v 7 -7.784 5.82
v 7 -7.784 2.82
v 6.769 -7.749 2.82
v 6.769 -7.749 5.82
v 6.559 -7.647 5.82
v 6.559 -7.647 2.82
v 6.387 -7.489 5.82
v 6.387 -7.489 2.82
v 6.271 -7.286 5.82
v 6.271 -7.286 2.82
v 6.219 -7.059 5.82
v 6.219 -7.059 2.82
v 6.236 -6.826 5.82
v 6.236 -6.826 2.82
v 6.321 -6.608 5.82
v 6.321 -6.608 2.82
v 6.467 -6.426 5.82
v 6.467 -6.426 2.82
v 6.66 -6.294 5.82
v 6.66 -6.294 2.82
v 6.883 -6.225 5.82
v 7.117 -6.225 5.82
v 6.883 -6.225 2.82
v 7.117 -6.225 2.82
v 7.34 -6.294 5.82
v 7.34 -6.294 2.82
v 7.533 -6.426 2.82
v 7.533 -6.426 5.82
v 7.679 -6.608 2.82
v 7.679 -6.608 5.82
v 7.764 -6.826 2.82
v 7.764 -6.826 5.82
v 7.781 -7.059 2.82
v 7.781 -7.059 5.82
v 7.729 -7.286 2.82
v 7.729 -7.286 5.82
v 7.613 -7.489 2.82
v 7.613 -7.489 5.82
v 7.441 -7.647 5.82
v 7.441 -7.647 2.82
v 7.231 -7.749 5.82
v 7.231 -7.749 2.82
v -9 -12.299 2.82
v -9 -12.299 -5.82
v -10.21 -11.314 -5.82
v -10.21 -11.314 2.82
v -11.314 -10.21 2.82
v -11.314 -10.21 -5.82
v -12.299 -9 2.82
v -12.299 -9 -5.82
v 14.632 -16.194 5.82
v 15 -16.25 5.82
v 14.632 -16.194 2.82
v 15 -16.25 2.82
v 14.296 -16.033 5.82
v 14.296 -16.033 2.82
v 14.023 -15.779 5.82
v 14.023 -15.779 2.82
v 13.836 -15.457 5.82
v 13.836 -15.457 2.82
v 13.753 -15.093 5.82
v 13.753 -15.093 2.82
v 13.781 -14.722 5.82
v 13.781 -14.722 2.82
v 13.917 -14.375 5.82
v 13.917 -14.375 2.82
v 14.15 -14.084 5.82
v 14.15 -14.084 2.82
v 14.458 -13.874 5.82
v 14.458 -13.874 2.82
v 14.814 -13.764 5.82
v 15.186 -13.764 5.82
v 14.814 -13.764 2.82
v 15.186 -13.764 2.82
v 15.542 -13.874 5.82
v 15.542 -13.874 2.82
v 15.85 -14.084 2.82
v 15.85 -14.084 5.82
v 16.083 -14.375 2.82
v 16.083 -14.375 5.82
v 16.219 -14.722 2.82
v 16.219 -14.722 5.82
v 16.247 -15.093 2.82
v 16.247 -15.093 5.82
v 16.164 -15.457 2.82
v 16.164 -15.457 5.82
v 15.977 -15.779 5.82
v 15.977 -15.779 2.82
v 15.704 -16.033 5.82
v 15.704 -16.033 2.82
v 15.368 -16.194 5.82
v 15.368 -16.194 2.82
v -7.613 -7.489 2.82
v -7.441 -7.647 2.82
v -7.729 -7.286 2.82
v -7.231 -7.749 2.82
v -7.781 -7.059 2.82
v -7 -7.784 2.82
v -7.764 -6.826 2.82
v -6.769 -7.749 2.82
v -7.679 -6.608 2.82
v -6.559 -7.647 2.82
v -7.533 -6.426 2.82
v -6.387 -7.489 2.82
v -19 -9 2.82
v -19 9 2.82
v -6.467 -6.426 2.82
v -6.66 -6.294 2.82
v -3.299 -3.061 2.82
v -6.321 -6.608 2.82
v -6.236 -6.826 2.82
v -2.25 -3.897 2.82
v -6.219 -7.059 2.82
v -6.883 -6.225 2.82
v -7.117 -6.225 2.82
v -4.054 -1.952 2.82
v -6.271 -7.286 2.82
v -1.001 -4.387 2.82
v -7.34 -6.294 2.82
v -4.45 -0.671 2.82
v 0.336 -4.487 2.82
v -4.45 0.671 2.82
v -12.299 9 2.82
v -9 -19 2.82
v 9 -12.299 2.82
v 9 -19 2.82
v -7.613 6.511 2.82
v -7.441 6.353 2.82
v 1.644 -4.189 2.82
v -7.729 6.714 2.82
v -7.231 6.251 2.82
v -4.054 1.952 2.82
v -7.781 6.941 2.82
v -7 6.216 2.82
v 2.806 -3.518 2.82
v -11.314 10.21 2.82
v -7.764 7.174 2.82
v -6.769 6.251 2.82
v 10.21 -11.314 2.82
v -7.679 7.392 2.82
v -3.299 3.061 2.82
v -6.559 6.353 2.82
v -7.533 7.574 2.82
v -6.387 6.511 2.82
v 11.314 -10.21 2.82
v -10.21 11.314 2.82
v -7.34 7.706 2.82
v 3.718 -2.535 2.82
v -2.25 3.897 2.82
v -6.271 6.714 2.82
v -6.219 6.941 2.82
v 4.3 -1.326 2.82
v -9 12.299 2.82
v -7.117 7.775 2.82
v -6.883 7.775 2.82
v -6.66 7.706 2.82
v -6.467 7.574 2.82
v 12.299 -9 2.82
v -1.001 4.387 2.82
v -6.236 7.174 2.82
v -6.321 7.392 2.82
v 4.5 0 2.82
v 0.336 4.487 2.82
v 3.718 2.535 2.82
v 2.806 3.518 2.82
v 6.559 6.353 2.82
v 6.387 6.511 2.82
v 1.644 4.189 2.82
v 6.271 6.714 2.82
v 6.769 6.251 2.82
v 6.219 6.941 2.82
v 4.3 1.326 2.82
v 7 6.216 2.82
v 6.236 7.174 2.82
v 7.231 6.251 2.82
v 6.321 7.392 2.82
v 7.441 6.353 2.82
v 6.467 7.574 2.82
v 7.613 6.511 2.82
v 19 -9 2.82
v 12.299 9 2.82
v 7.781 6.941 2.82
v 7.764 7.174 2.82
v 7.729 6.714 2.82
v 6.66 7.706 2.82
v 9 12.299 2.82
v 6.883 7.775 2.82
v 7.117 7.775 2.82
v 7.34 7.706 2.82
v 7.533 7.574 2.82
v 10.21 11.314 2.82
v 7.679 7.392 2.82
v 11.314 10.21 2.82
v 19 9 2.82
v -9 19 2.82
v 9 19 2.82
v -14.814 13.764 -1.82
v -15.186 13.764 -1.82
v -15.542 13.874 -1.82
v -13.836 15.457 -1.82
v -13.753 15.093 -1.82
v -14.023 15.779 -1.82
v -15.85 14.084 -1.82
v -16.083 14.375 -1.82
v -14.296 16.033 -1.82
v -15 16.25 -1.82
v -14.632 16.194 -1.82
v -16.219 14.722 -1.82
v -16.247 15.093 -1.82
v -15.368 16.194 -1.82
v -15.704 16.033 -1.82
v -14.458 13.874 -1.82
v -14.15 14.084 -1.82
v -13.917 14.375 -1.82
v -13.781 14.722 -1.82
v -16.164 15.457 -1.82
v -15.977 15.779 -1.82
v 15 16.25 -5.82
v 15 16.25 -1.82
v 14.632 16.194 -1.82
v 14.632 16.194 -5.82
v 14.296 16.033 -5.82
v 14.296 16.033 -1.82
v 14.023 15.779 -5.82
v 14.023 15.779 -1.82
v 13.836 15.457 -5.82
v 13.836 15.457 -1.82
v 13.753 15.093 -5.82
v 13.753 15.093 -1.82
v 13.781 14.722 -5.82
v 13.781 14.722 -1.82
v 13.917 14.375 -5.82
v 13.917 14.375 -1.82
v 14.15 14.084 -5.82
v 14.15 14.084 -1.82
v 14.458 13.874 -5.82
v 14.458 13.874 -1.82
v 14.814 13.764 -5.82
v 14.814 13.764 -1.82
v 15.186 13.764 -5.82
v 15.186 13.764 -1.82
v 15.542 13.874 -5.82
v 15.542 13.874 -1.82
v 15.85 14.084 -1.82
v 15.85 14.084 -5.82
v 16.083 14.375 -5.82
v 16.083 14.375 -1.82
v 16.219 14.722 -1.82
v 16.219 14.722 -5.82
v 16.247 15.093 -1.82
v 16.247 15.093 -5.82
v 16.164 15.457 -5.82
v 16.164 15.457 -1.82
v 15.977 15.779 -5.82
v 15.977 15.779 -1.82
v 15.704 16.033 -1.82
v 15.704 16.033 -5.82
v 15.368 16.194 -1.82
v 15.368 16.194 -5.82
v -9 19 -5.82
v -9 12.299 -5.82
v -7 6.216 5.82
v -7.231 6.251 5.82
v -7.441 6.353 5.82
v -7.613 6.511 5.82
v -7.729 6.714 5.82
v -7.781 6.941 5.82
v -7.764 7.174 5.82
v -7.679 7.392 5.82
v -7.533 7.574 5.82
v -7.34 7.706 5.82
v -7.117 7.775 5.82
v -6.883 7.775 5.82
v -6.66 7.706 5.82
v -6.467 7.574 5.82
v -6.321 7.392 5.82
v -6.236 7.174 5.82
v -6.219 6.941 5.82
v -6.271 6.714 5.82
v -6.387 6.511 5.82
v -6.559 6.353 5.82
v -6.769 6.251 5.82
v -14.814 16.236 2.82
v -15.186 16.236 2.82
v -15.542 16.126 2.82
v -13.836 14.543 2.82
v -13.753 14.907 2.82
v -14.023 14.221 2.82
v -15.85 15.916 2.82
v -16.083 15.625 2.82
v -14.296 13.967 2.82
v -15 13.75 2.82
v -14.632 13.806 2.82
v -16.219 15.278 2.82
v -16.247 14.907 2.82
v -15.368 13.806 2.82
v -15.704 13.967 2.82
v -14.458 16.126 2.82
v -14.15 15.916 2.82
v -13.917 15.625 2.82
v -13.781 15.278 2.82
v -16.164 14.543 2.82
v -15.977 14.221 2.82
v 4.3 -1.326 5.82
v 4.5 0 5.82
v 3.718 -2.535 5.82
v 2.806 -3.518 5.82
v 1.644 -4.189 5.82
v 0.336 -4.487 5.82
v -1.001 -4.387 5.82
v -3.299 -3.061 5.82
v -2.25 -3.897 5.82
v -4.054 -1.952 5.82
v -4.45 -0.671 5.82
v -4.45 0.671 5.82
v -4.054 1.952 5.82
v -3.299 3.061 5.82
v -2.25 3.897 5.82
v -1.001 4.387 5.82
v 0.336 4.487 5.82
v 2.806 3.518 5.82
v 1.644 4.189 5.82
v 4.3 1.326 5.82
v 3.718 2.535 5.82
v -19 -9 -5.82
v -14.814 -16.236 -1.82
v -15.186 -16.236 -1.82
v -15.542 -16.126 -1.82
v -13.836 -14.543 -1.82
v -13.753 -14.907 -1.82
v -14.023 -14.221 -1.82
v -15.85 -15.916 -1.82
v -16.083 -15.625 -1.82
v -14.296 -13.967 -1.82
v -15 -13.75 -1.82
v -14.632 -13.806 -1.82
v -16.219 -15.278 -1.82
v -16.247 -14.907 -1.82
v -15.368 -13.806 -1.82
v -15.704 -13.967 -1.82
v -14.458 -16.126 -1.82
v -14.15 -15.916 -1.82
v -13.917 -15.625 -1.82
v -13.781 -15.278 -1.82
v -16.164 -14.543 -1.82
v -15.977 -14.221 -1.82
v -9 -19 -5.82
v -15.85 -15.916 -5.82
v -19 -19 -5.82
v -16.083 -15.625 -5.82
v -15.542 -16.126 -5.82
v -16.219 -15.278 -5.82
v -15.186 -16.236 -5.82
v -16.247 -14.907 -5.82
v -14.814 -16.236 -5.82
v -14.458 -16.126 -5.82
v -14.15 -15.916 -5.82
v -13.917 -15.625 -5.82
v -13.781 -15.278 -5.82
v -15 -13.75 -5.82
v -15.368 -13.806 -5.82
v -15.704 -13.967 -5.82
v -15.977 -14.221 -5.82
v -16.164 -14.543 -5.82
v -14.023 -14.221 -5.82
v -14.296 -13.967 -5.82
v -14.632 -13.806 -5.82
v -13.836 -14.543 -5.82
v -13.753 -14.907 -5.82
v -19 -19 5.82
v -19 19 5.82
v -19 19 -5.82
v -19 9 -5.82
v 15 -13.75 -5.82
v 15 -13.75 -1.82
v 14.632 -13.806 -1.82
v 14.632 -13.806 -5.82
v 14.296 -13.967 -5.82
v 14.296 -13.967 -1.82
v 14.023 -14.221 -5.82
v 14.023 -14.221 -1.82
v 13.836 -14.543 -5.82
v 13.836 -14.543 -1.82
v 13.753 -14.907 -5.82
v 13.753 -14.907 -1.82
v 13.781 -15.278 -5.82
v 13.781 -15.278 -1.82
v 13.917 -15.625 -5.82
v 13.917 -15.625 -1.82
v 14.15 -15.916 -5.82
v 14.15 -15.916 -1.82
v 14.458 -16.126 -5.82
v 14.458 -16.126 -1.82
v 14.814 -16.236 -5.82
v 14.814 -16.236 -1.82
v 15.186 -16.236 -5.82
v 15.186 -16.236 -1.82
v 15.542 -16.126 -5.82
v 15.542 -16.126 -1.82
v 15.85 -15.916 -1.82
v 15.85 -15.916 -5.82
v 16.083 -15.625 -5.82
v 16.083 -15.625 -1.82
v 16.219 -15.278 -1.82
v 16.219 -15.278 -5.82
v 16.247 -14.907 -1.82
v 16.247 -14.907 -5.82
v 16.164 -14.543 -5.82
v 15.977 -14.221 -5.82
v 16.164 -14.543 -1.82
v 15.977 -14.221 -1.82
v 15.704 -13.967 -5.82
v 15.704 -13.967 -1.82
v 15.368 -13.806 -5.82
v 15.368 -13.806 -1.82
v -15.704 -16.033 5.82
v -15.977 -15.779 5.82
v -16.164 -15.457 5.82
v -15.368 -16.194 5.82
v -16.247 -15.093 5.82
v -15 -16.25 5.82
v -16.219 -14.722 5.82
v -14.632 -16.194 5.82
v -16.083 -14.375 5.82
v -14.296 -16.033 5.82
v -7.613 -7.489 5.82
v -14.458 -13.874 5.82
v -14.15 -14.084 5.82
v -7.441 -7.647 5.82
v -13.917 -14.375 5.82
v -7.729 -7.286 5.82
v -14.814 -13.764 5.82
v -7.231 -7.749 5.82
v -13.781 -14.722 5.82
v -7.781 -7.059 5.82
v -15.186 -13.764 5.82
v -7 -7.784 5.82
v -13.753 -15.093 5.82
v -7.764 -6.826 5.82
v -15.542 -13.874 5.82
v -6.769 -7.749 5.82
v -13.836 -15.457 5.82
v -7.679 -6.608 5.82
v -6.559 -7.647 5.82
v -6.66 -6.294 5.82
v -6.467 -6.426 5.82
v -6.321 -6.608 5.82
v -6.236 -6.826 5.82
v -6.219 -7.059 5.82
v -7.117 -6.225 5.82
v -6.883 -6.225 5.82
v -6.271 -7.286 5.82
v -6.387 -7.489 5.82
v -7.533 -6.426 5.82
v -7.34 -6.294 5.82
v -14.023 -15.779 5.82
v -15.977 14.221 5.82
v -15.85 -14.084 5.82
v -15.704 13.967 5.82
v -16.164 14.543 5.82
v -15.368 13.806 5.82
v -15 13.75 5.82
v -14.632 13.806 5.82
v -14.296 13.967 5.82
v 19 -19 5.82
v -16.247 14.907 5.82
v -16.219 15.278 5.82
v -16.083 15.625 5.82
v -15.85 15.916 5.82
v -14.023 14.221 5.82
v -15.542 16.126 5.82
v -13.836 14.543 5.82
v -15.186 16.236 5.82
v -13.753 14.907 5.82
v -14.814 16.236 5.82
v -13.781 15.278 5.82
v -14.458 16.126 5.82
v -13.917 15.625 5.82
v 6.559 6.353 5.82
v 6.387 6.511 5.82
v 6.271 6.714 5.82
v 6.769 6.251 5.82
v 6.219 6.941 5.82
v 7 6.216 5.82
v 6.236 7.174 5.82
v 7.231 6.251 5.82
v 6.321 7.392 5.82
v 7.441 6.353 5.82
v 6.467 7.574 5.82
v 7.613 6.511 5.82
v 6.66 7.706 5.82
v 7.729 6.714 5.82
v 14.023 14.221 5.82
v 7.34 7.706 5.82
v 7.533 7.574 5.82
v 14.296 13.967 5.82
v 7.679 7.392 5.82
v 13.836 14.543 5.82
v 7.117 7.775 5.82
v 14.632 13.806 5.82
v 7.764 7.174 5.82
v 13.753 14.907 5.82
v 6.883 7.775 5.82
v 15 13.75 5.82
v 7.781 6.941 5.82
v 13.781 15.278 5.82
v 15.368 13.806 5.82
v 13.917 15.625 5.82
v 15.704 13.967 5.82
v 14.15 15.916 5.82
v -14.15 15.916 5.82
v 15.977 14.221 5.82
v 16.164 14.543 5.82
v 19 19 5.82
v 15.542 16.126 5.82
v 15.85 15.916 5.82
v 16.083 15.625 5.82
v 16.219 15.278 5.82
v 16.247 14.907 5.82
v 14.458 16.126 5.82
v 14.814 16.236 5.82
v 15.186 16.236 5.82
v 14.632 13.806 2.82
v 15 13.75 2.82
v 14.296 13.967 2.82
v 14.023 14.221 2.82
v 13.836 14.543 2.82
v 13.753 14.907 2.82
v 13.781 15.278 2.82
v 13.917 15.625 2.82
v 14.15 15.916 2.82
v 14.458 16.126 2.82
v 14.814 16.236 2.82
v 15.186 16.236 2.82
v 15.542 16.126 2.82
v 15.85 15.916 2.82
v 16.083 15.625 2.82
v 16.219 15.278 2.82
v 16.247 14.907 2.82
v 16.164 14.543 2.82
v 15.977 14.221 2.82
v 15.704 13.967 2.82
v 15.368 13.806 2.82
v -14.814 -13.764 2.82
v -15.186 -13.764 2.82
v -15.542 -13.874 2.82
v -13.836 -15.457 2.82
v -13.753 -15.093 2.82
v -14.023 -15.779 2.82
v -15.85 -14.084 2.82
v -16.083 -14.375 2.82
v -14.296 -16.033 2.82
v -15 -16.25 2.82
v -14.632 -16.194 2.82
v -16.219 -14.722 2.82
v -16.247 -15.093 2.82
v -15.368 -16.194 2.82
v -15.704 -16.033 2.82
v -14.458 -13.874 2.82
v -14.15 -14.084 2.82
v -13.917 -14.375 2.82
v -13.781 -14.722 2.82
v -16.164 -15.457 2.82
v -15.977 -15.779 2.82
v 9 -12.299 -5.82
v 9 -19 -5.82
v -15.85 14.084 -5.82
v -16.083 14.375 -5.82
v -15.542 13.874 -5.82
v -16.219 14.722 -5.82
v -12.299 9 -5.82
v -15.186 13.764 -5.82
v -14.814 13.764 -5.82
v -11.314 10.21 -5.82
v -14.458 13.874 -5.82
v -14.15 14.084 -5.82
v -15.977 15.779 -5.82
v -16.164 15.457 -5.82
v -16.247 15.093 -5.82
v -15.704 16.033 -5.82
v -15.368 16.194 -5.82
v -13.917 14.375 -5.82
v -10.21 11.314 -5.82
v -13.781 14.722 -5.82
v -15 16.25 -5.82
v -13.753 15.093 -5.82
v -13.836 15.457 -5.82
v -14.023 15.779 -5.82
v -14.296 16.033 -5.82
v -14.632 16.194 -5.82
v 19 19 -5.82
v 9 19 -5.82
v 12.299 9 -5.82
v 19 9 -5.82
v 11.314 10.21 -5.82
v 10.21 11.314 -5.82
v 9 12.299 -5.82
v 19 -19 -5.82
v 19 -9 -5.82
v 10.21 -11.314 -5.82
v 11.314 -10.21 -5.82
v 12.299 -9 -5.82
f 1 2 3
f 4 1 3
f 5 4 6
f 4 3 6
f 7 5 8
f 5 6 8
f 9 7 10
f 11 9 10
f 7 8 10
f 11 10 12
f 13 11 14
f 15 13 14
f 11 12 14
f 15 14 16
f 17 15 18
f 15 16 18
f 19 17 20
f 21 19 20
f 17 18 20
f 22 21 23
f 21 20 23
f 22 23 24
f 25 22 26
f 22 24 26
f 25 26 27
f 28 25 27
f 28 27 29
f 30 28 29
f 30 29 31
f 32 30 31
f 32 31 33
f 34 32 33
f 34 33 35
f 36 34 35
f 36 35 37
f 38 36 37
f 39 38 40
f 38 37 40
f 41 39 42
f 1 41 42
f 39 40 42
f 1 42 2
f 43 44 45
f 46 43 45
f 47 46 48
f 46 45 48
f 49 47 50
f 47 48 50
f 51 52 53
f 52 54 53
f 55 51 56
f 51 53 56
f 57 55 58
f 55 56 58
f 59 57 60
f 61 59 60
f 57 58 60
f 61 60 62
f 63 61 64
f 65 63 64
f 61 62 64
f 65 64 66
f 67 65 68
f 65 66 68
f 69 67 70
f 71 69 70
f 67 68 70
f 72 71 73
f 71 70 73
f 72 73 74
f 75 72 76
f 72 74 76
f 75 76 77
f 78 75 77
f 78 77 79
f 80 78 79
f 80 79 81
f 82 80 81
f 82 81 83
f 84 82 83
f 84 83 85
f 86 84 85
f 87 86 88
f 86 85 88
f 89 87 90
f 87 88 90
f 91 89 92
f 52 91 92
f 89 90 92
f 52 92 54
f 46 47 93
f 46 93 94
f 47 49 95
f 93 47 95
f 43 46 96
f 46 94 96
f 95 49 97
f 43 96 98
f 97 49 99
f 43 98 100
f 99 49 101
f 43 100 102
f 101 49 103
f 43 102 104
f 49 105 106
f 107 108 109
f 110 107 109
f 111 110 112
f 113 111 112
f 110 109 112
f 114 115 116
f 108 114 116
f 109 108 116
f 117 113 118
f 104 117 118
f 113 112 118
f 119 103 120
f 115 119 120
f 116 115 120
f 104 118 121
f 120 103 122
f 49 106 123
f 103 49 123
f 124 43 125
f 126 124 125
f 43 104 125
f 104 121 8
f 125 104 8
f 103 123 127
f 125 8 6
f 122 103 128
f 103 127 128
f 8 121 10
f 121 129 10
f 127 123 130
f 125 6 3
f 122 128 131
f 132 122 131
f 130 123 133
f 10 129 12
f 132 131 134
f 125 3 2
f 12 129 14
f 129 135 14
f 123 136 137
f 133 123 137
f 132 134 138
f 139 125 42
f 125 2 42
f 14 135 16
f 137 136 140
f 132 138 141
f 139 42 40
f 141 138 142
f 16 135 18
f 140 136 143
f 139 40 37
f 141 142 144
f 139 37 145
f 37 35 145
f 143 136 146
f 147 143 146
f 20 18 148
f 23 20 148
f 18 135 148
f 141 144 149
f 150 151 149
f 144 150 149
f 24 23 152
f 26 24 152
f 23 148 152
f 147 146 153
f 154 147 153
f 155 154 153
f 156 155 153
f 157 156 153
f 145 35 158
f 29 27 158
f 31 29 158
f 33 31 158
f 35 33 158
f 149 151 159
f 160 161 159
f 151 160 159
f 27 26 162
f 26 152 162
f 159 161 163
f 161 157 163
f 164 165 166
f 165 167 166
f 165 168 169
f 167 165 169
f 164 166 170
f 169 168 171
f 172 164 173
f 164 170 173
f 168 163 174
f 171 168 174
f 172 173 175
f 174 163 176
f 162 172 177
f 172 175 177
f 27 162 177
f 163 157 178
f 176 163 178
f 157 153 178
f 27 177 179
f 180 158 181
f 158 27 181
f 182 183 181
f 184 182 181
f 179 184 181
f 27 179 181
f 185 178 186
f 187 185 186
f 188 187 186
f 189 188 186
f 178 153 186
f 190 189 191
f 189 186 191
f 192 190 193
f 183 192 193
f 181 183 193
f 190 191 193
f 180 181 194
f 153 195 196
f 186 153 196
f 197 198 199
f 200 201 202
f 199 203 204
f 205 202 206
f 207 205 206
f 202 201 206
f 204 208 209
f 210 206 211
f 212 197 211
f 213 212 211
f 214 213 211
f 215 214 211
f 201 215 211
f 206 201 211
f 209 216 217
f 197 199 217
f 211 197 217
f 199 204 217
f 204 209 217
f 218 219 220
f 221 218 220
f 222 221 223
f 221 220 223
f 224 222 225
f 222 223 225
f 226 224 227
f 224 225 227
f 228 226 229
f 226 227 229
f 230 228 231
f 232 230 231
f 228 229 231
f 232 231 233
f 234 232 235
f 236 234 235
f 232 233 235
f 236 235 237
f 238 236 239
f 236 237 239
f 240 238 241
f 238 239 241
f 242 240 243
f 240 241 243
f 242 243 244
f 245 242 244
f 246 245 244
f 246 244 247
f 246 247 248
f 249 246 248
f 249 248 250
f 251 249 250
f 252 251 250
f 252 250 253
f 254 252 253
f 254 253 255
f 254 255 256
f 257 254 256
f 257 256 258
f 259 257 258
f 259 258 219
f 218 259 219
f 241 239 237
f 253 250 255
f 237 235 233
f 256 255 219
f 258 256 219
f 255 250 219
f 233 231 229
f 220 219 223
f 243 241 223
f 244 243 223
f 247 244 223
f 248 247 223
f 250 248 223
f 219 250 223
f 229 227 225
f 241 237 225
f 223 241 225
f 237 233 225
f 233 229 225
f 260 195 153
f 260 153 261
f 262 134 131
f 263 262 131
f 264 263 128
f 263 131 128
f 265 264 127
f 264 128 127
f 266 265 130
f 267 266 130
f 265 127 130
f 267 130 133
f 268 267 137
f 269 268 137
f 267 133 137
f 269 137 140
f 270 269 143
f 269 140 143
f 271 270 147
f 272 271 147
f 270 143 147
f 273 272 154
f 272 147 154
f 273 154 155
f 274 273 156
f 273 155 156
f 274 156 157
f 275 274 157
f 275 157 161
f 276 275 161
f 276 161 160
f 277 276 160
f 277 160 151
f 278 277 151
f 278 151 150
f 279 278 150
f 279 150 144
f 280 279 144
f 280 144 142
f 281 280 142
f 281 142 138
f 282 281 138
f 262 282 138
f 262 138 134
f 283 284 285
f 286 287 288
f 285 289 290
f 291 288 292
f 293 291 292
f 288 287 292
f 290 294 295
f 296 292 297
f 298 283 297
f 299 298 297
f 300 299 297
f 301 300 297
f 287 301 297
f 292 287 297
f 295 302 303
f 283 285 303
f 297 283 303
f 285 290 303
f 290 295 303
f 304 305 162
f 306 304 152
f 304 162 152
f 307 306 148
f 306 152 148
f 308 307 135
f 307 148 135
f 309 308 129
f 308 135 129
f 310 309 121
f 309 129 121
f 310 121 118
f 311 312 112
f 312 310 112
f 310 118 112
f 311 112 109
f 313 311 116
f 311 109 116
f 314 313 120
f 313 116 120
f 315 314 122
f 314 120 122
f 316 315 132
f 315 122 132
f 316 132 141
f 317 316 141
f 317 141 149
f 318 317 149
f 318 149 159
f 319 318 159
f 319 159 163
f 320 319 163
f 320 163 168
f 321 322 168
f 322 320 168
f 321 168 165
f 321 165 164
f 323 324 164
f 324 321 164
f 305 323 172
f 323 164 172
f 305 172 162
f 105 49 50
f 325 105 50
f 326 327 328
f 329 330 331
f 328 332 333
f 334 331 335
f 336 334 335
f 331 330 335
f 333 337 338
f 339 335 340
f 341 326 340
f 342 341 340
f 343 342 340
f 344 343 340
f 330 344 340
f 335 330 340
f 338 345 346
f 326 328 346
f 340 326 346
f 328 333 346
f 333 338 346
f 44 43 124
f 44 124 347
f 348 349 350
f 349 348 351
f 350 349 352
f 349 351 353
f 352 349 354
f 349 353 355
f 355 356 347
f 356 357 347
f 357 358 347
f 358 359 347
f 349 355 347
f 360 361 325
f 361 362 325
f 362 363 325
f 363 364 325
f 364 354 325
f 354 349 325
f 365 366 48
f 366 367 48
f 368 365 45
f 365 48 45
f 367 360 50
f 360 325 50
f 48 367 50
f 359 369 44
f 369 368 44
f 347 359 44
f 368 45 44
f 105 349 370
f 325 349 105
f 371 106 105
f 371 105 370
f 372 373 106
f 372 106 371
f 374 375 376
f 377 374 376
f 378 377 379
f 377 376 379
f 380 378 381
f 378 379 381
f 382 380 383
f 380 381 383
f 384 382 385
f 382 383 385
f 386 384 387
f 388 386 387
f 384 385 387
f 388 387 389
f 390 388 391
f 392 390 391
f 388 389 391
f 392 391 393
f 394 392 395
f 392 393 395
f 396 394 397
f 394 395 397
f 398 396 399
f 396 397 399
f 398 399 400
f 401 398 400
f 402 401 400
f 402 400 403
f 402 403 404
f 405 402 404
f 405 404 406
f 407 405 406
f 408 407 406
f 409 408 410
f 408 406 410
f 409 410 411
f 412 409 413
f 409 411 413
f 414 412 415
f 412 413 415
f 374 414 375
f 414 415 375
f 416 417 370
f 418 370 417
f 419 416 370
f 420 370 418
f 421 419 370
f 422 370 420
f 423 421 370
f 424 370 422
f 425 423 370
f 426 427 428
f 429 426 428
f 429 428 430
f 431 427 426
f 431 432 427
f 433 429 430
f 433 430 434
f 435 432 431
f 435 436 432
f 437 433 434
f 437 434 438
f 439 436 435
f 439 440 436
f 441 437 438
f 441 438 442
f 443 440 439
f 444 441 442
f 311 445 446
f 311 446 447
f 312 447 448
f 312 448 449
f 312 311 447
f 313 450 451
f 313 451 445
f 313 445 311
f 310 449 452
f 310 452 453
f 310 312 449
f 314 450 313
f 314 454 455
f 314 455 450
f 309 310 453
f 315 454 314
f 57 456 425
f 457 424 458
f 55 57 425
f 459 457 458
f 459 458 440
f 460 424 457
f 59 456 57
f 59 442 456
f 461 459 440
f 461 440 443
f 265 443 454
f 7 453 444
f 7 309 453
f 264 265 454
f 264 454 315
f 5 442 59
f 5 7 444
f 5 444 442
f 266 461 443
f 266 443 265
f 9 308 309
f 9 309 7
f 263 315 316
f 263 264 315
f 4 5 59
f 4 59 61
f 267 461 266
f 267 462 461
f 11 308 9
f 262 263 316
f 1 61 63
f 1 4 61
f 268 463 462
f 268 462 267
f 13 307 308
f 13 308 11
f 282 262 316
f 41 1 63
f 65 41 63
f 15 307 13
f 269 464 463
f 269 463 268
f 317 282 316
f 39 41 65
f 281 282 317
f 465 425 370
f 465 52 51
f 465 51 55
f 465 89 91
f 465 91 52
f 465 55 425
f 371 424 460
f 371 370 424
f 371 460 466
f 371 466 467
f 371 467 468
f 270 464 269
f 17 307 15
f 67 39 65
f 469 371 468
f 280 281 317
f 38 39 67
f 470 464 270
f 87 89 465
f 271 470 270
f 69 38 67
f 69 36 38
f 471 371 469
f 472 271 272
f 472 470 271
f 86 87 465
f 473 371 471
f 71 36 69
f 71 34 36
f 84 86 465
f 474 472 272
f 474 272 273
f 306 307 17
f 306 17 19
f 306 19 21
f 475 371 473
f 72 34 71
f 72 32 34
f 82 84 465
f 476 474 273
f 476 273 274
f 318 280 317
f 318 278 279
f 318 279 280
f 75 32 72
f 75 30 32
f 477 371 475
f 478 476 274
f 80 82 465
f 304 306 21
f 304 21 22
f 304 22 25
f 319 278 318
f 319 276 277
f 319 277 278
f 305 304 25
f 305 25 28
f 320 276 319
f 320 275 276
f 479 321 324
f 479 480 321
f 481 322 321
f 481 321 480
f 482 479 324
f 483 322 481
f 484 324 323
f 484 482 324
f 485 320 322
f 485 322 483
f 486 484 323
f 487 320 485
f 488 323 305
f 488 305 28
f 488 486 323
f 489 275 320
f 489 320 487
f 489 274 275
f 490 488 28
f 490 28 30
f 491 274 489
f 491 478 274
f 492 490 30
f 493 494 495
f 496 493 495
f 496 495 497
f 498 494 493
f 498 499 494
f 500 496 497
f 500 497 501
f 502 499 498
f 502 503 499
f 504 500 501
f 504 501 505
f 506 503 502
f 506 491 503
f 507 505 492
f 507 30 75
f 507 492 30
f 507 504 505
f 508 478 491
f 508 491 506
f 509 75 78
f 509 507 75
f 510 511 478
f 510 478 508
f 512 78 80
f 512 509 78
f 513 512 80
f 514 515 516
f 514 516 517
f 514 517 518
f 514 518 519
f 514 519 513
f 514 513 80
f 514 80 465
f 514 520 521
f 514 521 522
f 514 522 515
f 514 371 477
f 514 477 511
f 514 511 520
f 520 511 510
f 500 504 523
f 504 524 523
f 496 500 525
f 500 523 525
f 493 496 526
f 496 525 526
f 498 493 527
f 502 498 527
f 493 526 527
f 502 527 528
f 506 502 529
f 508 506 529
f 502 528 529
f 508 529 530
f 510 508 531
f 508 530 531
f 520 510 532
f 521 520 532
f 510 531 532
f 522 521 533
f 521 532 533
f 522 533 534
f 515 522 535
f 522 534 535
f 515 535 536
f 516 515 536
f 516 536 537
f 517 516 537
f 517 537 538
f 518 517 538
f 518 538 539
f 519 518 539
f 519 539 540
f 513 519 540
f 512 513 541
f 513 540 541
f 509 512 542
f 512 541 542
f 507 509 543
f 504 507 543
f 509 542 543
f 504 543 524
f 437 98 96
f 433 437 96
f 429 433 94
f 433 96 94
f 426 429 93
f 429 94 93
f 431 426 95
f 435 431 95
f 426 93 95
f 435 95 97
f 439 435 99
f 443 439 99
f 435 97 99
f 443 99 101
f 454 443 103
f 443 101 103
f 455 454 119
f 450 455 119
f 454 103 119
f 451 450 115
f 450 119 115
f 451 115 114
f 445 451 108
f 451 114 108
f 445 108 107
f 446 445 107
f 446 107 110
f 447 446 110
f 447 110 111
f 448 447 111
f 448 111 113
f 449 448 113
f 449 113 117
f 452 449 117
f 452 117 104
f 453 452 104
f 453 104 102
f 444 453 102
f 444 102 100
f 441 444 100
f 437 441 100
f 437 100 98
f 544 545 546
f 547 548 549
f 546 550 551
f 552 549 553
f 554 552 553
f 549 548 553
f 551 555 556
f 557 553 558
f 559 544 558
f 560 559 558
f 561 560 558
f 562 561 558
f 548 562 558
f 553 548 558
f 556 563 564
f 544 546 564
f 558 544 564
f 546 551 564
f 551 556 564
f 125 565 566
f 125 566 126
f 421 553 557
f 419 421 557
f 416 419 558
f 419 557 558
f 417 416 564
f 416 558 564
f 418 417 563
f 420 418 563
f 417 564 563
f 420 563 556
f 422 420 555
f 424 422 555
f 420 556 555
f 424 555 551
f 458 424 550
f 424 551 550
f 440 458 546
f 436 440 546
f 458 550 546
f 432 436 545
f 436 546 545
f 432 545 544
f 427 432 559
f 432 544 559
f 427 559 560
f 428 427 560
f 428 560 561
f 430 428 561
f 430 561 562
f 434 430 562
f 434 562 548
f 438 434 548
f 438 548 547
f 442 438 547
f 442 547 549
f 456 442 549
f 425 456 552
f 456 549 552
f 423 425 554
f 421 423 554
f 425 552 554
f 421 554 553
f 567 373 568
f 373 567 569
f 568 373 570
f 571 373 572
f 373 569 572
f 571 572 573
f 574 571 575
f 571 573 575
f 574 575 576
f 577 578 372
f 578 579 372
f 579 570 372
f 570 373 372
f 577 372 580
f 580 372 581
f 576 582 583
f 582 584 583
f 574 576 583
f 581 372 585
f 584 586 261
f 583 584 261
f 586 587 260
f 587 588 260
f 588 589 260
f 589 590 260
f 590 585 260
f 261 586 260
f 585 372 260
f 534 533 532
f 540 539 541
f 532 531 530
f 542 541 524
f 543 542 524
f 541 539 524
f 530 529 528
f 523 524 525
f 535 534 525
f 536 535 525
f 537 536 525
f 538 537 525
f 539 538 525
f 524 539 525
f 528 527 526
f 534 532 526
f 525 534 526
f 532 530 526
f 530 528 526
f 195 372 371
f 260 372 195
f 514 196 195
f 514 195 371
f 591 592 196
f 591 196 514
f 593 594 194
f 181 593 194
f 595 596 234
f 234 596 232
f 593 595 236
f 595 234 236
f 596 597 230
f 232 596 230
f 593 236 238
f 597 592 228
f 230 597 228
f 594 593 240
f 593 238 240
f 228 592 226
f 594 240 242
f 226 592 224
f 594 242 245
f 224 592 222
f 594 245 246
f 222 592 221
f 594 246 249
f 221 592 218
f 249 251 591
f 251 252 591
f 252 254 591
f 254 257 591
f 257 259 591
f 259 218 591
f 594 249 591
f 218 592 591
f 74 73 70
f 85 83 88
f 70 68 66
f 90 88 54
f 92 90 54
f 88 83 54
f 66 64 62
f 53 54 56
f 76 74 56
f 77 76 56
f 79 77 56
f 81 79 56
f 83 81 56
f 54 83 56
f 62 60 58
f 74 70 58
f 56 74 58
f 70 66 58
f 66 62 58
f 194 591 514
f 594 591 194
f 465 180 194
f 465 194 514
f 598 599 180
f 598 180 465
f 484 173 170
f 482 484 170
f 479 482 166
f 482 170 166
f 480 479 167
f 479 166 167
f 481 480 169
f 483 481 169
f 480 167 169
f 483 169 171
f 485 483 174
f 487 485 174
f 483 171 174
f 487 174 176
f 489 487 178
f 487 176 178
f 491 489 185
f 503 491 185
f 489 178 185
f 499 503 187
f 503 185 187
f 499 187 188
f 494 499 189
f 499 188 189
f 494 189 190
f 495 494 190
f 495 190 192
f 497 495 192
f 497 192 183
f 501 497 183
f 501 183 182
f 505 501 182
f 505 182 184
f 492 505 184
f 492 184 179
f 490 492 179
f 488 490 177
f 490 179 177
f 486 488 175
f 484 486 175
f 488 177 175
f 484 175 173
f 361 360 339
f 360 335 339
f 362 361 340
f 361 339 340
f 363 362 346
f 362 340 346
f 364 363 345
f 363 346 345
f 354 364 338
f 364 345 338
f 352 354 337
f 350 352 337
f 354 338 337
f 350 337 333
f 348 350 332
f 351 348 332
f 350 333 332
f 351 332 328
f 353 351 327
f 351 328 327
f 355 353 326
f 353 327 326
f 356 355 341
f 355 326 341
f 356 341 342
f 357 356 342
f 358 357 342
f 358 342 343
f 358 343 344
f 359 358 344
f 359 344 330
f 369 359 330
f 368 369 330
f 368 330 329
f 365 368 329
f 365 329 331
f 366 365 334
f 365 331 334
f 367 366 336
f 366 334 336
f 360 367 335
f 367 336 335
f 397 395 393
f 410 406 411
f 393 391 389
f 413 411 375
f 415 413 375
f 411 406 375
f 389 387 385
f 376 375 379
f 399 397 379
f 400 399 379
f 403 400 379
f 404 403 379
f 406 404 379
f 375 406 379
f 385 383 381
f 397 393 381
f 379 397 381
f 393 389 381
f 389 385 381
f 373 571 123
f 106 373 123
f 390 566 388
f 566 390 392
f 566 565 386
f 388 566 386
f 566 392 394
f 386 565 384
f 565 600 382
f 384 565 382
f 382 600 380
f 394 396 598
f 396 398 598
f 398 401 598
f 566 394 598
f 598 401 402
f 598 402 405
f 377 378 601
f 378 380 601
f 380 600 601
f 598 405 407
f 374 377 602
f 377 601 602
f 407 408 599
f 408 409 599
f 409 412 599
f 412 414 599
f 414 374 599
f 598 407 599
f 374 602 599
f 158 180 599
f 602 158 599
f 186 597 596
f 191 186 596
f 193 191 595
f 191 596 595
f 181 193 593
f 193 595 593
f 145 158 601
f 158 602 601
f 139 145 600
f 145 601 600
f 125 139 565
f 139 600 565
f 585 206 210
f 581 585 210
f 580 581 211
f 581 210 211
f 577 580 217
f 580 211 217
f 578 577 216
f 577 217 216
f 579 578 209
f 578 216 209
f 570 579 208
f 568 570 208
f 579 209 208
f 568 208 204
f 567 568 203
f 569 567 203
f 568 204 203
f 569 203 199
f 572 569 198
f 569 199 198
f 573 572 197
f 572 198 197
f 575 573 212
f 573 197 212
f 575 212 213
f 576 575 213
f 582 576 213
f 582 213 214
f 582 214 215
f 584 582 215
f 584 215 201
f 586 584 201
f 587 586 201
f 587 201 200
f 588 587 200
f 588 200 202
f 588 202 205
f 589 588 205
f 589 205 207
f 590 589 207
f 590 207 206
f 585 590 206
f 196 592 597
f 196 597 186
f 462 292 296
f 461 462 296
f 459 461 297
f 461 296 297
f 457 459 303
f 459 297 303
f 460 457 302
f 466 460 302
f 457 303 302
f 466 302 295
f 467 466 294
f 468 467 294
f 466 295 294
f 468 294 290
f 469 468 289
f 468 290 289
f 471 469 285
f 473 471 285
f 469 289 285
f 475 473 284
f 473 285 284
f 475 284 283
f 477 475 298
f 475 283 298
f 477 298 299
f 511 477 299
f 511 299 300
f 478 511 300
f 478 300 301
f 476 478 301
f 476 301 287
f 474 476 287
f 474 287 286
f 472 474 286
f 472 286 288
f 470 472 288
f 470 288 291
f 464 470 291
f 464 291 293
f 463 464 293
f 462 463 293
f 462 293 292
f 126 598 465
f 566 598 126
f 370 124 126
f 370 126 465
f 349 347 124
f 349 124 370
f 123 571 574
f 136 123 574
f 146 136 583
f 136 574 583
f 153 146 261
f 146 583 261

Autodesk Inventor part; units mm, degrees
ref_plane "YZ Plane" through (0, 0, 0) normal (1, 0, 0) x (0, 1, 0)
ref_plane "XZ Plane" through (0, 0, 0) normal (0, 1, 0) x (-1, 0, 0)
ref_plane "XY Plane" through (0, 0, 0) normal (0, 0, 1) x (1, 0, 0)
sketch "Sketch1" plane through (0, 0, 0) normal (0, 0, 1) x (1, 0, 0)
  line L0 (-19, 19) -> (19, 19)
  line L1 (19, 19) -> (19, -19)
  line L2 (19, -19) -> (-19, -19)
  line L3 (-19, -19) -> (-19, 19)
  line L4 (-19, 19) -> (19, -19) construction
  line L5 (19, 19) -> (-19, -19) construction
  circle A0 centre (0, 0) radius 4.5
  dimension "d0" = 38
  dimension "d1" = 38
  dimension "d2" = 9
extrude "Extrusion1" add sketch "Sketch1" along normal mid plane 11.64
sketch "Sketch4" plane through (0, 0, 5.82) normal (0, 0, 1) x (1, 0, 0)
  line L0 (-11.25, -11.25) -> (11.25, -11.25) construction
  line L1 (11.25, -11.25) -> (11.25, 11.25) construction
  line L2 (11.25, 11.25) -> (-11.25, 11.25) construction
  line L3 (-11.25, 11.25) -> (-11.25, -11.25) construction
  line L4 (-11.25, -11.25) -> (11.25, 11.25) construction
  line L5 (11.25, -11.25) -> (-11.25, 11.25) construction
  point P0 (0, 0)
  point P1 (-7, -7)
  point P2 (0, 0)
  point P3 (0, 0)
  point P4 (-7, 7)
  point P5 (7, -7)
  point P6 (7, 7)
  dimension "d17" = 22.5
  dimension "d18" = 22.5
  dimension "d47" = 7
  dimension "d48" = 7
  dimension "d51" = 14
  dimension "d54" = 14
sketch "Sketch5" plane through (0, 0, -5.82) normal (0, 0, -1) x (-1, 0, 0)
  circle A0 centre (0, 0) radius 4.5 projected
  circle A1 centre (0, 0) radius 15.24
  dimension "d19" = 30.48
extrude "Extrusion2" cut sketch "Sketch5" against normal blind 8.64 contours A0 | A1
sketch "Sketch6" plane through (-19, 19, 5.82) normal (0, 1, 0) x (1, 0, 0)
  line L0 (0, 11.64) -> (38, 11.64) projected
  line L1 (3.76, 3) -> (34.24, 3) projected
  line L2 (10, 11.64) -> (28, 11.64)
  line L3 (28, 11.64) -> (28, 3)
  line L4 (28, 3) -> (10, 3)
  line L5 (10, 3) -> (10, 11.64)
  line L6 (0, 11.64) -> (0, 0) projected
  line L7 (38, 11.64) -> (38, 0) projected
  point P0 (19, 5.82)
  point P1 (10, 3)
  dimension "d22" = 10
  dimension "d23" = 10
extrude "Extrusion3" cut sketch "Sketch6" against normal through all
sketch "Sketch7" plane through (19, -19, 5.82) normal (1, 0, 0) x (0, 0, -1)
  line L0 (11.64, 31.2987) -> (11.64, 6.7013) projected
  line L1 (3, 31.2987) -> (3, 6.7013) projected
  line L2 (11.64, 28) -> (3, 28)
  line L3 (3, 28) -> (3, 10)
  line L4 (3, 10) -> (11.64, 10)
  line L5 (11.64, 10) -> (11.64, 28)
  line L6 (11.64, 38) -> (0, 38) projected
  line L7 (11.64, 0) -> (0, 0) projected
  point P0 (5.82, 19)
  point P1 (11.64, 10)
  point P2 (3, 28)
  dimension "d26" = 10
  dimension "d27" = 10
extrude "Extrusion4" cut sketch "Sketch7" against normal through all
sketch "Sketch8" plane through (0, 0, -5.82) normal (0, 0, -1) x (-1, 0, 0)
  line L0 (-12.2987, -9) -> (-19, -9) projected
  line L1 (-19, -9) -> (-19, -19) projected
  line L2 (-19, -19) -> (-9, -19) projected
  line L3 (-9, -19) -> (-9, -12.2987) projected
  arc A0 (-12.2987, -9) -> (-9, -12.2987) centre (0, 0) ccw projected
  point P0 (-15, -15)
  point P1 (-15, 15)
  point P2 (15, -15)
  point P3 (15, 15)
  dimension "d30" = 15
  dimension "d31" = 15
  dimension "d34" = 30
  dimension "d37" = 30
hole "Hole1" at (15, -15, -5.82) at (15, 15, -5.82) at (-15, 15, -5.82) at (-15, -15, -5.82) direction (0, 0, 1) diameter 2.5 depth 4
hole "Hole2" at (-7, -7, 5.82) at (-7, 7, 5.82) at (7, -7, 5.82) at (7, 7, 5.82) direction (0, 0, -1) diameter 1.567 end through all thread size "M2x0.4" class "6H" standard "ANSI Metric M Profile"
sketch "Sketch9" plane through (0, 0, 5.82) normal (0, 0, 1) x (1, 0, 0)
  circle A0 centre (15, -15) radius 1.25 projected
  circle A1 centre (-15, -15) radius 1.25 projected
  circle A2 centre (-15, 15) radius 1.25 projected
  circle A3 centre (15, 15) radius 1.25 projected
  point P0 (0, 0)
hole "Hole3" at (15, -15, 5.82) at (-15, -15, 5.82) at (-15, 15, 5.82) at (15, 15, 5.82) direction (0, 0, -1) diameter 2.5 depth 3
equation "\"d1\" = d0"
equation "\"d18\" = d17"
properties part number "pmtbase"
